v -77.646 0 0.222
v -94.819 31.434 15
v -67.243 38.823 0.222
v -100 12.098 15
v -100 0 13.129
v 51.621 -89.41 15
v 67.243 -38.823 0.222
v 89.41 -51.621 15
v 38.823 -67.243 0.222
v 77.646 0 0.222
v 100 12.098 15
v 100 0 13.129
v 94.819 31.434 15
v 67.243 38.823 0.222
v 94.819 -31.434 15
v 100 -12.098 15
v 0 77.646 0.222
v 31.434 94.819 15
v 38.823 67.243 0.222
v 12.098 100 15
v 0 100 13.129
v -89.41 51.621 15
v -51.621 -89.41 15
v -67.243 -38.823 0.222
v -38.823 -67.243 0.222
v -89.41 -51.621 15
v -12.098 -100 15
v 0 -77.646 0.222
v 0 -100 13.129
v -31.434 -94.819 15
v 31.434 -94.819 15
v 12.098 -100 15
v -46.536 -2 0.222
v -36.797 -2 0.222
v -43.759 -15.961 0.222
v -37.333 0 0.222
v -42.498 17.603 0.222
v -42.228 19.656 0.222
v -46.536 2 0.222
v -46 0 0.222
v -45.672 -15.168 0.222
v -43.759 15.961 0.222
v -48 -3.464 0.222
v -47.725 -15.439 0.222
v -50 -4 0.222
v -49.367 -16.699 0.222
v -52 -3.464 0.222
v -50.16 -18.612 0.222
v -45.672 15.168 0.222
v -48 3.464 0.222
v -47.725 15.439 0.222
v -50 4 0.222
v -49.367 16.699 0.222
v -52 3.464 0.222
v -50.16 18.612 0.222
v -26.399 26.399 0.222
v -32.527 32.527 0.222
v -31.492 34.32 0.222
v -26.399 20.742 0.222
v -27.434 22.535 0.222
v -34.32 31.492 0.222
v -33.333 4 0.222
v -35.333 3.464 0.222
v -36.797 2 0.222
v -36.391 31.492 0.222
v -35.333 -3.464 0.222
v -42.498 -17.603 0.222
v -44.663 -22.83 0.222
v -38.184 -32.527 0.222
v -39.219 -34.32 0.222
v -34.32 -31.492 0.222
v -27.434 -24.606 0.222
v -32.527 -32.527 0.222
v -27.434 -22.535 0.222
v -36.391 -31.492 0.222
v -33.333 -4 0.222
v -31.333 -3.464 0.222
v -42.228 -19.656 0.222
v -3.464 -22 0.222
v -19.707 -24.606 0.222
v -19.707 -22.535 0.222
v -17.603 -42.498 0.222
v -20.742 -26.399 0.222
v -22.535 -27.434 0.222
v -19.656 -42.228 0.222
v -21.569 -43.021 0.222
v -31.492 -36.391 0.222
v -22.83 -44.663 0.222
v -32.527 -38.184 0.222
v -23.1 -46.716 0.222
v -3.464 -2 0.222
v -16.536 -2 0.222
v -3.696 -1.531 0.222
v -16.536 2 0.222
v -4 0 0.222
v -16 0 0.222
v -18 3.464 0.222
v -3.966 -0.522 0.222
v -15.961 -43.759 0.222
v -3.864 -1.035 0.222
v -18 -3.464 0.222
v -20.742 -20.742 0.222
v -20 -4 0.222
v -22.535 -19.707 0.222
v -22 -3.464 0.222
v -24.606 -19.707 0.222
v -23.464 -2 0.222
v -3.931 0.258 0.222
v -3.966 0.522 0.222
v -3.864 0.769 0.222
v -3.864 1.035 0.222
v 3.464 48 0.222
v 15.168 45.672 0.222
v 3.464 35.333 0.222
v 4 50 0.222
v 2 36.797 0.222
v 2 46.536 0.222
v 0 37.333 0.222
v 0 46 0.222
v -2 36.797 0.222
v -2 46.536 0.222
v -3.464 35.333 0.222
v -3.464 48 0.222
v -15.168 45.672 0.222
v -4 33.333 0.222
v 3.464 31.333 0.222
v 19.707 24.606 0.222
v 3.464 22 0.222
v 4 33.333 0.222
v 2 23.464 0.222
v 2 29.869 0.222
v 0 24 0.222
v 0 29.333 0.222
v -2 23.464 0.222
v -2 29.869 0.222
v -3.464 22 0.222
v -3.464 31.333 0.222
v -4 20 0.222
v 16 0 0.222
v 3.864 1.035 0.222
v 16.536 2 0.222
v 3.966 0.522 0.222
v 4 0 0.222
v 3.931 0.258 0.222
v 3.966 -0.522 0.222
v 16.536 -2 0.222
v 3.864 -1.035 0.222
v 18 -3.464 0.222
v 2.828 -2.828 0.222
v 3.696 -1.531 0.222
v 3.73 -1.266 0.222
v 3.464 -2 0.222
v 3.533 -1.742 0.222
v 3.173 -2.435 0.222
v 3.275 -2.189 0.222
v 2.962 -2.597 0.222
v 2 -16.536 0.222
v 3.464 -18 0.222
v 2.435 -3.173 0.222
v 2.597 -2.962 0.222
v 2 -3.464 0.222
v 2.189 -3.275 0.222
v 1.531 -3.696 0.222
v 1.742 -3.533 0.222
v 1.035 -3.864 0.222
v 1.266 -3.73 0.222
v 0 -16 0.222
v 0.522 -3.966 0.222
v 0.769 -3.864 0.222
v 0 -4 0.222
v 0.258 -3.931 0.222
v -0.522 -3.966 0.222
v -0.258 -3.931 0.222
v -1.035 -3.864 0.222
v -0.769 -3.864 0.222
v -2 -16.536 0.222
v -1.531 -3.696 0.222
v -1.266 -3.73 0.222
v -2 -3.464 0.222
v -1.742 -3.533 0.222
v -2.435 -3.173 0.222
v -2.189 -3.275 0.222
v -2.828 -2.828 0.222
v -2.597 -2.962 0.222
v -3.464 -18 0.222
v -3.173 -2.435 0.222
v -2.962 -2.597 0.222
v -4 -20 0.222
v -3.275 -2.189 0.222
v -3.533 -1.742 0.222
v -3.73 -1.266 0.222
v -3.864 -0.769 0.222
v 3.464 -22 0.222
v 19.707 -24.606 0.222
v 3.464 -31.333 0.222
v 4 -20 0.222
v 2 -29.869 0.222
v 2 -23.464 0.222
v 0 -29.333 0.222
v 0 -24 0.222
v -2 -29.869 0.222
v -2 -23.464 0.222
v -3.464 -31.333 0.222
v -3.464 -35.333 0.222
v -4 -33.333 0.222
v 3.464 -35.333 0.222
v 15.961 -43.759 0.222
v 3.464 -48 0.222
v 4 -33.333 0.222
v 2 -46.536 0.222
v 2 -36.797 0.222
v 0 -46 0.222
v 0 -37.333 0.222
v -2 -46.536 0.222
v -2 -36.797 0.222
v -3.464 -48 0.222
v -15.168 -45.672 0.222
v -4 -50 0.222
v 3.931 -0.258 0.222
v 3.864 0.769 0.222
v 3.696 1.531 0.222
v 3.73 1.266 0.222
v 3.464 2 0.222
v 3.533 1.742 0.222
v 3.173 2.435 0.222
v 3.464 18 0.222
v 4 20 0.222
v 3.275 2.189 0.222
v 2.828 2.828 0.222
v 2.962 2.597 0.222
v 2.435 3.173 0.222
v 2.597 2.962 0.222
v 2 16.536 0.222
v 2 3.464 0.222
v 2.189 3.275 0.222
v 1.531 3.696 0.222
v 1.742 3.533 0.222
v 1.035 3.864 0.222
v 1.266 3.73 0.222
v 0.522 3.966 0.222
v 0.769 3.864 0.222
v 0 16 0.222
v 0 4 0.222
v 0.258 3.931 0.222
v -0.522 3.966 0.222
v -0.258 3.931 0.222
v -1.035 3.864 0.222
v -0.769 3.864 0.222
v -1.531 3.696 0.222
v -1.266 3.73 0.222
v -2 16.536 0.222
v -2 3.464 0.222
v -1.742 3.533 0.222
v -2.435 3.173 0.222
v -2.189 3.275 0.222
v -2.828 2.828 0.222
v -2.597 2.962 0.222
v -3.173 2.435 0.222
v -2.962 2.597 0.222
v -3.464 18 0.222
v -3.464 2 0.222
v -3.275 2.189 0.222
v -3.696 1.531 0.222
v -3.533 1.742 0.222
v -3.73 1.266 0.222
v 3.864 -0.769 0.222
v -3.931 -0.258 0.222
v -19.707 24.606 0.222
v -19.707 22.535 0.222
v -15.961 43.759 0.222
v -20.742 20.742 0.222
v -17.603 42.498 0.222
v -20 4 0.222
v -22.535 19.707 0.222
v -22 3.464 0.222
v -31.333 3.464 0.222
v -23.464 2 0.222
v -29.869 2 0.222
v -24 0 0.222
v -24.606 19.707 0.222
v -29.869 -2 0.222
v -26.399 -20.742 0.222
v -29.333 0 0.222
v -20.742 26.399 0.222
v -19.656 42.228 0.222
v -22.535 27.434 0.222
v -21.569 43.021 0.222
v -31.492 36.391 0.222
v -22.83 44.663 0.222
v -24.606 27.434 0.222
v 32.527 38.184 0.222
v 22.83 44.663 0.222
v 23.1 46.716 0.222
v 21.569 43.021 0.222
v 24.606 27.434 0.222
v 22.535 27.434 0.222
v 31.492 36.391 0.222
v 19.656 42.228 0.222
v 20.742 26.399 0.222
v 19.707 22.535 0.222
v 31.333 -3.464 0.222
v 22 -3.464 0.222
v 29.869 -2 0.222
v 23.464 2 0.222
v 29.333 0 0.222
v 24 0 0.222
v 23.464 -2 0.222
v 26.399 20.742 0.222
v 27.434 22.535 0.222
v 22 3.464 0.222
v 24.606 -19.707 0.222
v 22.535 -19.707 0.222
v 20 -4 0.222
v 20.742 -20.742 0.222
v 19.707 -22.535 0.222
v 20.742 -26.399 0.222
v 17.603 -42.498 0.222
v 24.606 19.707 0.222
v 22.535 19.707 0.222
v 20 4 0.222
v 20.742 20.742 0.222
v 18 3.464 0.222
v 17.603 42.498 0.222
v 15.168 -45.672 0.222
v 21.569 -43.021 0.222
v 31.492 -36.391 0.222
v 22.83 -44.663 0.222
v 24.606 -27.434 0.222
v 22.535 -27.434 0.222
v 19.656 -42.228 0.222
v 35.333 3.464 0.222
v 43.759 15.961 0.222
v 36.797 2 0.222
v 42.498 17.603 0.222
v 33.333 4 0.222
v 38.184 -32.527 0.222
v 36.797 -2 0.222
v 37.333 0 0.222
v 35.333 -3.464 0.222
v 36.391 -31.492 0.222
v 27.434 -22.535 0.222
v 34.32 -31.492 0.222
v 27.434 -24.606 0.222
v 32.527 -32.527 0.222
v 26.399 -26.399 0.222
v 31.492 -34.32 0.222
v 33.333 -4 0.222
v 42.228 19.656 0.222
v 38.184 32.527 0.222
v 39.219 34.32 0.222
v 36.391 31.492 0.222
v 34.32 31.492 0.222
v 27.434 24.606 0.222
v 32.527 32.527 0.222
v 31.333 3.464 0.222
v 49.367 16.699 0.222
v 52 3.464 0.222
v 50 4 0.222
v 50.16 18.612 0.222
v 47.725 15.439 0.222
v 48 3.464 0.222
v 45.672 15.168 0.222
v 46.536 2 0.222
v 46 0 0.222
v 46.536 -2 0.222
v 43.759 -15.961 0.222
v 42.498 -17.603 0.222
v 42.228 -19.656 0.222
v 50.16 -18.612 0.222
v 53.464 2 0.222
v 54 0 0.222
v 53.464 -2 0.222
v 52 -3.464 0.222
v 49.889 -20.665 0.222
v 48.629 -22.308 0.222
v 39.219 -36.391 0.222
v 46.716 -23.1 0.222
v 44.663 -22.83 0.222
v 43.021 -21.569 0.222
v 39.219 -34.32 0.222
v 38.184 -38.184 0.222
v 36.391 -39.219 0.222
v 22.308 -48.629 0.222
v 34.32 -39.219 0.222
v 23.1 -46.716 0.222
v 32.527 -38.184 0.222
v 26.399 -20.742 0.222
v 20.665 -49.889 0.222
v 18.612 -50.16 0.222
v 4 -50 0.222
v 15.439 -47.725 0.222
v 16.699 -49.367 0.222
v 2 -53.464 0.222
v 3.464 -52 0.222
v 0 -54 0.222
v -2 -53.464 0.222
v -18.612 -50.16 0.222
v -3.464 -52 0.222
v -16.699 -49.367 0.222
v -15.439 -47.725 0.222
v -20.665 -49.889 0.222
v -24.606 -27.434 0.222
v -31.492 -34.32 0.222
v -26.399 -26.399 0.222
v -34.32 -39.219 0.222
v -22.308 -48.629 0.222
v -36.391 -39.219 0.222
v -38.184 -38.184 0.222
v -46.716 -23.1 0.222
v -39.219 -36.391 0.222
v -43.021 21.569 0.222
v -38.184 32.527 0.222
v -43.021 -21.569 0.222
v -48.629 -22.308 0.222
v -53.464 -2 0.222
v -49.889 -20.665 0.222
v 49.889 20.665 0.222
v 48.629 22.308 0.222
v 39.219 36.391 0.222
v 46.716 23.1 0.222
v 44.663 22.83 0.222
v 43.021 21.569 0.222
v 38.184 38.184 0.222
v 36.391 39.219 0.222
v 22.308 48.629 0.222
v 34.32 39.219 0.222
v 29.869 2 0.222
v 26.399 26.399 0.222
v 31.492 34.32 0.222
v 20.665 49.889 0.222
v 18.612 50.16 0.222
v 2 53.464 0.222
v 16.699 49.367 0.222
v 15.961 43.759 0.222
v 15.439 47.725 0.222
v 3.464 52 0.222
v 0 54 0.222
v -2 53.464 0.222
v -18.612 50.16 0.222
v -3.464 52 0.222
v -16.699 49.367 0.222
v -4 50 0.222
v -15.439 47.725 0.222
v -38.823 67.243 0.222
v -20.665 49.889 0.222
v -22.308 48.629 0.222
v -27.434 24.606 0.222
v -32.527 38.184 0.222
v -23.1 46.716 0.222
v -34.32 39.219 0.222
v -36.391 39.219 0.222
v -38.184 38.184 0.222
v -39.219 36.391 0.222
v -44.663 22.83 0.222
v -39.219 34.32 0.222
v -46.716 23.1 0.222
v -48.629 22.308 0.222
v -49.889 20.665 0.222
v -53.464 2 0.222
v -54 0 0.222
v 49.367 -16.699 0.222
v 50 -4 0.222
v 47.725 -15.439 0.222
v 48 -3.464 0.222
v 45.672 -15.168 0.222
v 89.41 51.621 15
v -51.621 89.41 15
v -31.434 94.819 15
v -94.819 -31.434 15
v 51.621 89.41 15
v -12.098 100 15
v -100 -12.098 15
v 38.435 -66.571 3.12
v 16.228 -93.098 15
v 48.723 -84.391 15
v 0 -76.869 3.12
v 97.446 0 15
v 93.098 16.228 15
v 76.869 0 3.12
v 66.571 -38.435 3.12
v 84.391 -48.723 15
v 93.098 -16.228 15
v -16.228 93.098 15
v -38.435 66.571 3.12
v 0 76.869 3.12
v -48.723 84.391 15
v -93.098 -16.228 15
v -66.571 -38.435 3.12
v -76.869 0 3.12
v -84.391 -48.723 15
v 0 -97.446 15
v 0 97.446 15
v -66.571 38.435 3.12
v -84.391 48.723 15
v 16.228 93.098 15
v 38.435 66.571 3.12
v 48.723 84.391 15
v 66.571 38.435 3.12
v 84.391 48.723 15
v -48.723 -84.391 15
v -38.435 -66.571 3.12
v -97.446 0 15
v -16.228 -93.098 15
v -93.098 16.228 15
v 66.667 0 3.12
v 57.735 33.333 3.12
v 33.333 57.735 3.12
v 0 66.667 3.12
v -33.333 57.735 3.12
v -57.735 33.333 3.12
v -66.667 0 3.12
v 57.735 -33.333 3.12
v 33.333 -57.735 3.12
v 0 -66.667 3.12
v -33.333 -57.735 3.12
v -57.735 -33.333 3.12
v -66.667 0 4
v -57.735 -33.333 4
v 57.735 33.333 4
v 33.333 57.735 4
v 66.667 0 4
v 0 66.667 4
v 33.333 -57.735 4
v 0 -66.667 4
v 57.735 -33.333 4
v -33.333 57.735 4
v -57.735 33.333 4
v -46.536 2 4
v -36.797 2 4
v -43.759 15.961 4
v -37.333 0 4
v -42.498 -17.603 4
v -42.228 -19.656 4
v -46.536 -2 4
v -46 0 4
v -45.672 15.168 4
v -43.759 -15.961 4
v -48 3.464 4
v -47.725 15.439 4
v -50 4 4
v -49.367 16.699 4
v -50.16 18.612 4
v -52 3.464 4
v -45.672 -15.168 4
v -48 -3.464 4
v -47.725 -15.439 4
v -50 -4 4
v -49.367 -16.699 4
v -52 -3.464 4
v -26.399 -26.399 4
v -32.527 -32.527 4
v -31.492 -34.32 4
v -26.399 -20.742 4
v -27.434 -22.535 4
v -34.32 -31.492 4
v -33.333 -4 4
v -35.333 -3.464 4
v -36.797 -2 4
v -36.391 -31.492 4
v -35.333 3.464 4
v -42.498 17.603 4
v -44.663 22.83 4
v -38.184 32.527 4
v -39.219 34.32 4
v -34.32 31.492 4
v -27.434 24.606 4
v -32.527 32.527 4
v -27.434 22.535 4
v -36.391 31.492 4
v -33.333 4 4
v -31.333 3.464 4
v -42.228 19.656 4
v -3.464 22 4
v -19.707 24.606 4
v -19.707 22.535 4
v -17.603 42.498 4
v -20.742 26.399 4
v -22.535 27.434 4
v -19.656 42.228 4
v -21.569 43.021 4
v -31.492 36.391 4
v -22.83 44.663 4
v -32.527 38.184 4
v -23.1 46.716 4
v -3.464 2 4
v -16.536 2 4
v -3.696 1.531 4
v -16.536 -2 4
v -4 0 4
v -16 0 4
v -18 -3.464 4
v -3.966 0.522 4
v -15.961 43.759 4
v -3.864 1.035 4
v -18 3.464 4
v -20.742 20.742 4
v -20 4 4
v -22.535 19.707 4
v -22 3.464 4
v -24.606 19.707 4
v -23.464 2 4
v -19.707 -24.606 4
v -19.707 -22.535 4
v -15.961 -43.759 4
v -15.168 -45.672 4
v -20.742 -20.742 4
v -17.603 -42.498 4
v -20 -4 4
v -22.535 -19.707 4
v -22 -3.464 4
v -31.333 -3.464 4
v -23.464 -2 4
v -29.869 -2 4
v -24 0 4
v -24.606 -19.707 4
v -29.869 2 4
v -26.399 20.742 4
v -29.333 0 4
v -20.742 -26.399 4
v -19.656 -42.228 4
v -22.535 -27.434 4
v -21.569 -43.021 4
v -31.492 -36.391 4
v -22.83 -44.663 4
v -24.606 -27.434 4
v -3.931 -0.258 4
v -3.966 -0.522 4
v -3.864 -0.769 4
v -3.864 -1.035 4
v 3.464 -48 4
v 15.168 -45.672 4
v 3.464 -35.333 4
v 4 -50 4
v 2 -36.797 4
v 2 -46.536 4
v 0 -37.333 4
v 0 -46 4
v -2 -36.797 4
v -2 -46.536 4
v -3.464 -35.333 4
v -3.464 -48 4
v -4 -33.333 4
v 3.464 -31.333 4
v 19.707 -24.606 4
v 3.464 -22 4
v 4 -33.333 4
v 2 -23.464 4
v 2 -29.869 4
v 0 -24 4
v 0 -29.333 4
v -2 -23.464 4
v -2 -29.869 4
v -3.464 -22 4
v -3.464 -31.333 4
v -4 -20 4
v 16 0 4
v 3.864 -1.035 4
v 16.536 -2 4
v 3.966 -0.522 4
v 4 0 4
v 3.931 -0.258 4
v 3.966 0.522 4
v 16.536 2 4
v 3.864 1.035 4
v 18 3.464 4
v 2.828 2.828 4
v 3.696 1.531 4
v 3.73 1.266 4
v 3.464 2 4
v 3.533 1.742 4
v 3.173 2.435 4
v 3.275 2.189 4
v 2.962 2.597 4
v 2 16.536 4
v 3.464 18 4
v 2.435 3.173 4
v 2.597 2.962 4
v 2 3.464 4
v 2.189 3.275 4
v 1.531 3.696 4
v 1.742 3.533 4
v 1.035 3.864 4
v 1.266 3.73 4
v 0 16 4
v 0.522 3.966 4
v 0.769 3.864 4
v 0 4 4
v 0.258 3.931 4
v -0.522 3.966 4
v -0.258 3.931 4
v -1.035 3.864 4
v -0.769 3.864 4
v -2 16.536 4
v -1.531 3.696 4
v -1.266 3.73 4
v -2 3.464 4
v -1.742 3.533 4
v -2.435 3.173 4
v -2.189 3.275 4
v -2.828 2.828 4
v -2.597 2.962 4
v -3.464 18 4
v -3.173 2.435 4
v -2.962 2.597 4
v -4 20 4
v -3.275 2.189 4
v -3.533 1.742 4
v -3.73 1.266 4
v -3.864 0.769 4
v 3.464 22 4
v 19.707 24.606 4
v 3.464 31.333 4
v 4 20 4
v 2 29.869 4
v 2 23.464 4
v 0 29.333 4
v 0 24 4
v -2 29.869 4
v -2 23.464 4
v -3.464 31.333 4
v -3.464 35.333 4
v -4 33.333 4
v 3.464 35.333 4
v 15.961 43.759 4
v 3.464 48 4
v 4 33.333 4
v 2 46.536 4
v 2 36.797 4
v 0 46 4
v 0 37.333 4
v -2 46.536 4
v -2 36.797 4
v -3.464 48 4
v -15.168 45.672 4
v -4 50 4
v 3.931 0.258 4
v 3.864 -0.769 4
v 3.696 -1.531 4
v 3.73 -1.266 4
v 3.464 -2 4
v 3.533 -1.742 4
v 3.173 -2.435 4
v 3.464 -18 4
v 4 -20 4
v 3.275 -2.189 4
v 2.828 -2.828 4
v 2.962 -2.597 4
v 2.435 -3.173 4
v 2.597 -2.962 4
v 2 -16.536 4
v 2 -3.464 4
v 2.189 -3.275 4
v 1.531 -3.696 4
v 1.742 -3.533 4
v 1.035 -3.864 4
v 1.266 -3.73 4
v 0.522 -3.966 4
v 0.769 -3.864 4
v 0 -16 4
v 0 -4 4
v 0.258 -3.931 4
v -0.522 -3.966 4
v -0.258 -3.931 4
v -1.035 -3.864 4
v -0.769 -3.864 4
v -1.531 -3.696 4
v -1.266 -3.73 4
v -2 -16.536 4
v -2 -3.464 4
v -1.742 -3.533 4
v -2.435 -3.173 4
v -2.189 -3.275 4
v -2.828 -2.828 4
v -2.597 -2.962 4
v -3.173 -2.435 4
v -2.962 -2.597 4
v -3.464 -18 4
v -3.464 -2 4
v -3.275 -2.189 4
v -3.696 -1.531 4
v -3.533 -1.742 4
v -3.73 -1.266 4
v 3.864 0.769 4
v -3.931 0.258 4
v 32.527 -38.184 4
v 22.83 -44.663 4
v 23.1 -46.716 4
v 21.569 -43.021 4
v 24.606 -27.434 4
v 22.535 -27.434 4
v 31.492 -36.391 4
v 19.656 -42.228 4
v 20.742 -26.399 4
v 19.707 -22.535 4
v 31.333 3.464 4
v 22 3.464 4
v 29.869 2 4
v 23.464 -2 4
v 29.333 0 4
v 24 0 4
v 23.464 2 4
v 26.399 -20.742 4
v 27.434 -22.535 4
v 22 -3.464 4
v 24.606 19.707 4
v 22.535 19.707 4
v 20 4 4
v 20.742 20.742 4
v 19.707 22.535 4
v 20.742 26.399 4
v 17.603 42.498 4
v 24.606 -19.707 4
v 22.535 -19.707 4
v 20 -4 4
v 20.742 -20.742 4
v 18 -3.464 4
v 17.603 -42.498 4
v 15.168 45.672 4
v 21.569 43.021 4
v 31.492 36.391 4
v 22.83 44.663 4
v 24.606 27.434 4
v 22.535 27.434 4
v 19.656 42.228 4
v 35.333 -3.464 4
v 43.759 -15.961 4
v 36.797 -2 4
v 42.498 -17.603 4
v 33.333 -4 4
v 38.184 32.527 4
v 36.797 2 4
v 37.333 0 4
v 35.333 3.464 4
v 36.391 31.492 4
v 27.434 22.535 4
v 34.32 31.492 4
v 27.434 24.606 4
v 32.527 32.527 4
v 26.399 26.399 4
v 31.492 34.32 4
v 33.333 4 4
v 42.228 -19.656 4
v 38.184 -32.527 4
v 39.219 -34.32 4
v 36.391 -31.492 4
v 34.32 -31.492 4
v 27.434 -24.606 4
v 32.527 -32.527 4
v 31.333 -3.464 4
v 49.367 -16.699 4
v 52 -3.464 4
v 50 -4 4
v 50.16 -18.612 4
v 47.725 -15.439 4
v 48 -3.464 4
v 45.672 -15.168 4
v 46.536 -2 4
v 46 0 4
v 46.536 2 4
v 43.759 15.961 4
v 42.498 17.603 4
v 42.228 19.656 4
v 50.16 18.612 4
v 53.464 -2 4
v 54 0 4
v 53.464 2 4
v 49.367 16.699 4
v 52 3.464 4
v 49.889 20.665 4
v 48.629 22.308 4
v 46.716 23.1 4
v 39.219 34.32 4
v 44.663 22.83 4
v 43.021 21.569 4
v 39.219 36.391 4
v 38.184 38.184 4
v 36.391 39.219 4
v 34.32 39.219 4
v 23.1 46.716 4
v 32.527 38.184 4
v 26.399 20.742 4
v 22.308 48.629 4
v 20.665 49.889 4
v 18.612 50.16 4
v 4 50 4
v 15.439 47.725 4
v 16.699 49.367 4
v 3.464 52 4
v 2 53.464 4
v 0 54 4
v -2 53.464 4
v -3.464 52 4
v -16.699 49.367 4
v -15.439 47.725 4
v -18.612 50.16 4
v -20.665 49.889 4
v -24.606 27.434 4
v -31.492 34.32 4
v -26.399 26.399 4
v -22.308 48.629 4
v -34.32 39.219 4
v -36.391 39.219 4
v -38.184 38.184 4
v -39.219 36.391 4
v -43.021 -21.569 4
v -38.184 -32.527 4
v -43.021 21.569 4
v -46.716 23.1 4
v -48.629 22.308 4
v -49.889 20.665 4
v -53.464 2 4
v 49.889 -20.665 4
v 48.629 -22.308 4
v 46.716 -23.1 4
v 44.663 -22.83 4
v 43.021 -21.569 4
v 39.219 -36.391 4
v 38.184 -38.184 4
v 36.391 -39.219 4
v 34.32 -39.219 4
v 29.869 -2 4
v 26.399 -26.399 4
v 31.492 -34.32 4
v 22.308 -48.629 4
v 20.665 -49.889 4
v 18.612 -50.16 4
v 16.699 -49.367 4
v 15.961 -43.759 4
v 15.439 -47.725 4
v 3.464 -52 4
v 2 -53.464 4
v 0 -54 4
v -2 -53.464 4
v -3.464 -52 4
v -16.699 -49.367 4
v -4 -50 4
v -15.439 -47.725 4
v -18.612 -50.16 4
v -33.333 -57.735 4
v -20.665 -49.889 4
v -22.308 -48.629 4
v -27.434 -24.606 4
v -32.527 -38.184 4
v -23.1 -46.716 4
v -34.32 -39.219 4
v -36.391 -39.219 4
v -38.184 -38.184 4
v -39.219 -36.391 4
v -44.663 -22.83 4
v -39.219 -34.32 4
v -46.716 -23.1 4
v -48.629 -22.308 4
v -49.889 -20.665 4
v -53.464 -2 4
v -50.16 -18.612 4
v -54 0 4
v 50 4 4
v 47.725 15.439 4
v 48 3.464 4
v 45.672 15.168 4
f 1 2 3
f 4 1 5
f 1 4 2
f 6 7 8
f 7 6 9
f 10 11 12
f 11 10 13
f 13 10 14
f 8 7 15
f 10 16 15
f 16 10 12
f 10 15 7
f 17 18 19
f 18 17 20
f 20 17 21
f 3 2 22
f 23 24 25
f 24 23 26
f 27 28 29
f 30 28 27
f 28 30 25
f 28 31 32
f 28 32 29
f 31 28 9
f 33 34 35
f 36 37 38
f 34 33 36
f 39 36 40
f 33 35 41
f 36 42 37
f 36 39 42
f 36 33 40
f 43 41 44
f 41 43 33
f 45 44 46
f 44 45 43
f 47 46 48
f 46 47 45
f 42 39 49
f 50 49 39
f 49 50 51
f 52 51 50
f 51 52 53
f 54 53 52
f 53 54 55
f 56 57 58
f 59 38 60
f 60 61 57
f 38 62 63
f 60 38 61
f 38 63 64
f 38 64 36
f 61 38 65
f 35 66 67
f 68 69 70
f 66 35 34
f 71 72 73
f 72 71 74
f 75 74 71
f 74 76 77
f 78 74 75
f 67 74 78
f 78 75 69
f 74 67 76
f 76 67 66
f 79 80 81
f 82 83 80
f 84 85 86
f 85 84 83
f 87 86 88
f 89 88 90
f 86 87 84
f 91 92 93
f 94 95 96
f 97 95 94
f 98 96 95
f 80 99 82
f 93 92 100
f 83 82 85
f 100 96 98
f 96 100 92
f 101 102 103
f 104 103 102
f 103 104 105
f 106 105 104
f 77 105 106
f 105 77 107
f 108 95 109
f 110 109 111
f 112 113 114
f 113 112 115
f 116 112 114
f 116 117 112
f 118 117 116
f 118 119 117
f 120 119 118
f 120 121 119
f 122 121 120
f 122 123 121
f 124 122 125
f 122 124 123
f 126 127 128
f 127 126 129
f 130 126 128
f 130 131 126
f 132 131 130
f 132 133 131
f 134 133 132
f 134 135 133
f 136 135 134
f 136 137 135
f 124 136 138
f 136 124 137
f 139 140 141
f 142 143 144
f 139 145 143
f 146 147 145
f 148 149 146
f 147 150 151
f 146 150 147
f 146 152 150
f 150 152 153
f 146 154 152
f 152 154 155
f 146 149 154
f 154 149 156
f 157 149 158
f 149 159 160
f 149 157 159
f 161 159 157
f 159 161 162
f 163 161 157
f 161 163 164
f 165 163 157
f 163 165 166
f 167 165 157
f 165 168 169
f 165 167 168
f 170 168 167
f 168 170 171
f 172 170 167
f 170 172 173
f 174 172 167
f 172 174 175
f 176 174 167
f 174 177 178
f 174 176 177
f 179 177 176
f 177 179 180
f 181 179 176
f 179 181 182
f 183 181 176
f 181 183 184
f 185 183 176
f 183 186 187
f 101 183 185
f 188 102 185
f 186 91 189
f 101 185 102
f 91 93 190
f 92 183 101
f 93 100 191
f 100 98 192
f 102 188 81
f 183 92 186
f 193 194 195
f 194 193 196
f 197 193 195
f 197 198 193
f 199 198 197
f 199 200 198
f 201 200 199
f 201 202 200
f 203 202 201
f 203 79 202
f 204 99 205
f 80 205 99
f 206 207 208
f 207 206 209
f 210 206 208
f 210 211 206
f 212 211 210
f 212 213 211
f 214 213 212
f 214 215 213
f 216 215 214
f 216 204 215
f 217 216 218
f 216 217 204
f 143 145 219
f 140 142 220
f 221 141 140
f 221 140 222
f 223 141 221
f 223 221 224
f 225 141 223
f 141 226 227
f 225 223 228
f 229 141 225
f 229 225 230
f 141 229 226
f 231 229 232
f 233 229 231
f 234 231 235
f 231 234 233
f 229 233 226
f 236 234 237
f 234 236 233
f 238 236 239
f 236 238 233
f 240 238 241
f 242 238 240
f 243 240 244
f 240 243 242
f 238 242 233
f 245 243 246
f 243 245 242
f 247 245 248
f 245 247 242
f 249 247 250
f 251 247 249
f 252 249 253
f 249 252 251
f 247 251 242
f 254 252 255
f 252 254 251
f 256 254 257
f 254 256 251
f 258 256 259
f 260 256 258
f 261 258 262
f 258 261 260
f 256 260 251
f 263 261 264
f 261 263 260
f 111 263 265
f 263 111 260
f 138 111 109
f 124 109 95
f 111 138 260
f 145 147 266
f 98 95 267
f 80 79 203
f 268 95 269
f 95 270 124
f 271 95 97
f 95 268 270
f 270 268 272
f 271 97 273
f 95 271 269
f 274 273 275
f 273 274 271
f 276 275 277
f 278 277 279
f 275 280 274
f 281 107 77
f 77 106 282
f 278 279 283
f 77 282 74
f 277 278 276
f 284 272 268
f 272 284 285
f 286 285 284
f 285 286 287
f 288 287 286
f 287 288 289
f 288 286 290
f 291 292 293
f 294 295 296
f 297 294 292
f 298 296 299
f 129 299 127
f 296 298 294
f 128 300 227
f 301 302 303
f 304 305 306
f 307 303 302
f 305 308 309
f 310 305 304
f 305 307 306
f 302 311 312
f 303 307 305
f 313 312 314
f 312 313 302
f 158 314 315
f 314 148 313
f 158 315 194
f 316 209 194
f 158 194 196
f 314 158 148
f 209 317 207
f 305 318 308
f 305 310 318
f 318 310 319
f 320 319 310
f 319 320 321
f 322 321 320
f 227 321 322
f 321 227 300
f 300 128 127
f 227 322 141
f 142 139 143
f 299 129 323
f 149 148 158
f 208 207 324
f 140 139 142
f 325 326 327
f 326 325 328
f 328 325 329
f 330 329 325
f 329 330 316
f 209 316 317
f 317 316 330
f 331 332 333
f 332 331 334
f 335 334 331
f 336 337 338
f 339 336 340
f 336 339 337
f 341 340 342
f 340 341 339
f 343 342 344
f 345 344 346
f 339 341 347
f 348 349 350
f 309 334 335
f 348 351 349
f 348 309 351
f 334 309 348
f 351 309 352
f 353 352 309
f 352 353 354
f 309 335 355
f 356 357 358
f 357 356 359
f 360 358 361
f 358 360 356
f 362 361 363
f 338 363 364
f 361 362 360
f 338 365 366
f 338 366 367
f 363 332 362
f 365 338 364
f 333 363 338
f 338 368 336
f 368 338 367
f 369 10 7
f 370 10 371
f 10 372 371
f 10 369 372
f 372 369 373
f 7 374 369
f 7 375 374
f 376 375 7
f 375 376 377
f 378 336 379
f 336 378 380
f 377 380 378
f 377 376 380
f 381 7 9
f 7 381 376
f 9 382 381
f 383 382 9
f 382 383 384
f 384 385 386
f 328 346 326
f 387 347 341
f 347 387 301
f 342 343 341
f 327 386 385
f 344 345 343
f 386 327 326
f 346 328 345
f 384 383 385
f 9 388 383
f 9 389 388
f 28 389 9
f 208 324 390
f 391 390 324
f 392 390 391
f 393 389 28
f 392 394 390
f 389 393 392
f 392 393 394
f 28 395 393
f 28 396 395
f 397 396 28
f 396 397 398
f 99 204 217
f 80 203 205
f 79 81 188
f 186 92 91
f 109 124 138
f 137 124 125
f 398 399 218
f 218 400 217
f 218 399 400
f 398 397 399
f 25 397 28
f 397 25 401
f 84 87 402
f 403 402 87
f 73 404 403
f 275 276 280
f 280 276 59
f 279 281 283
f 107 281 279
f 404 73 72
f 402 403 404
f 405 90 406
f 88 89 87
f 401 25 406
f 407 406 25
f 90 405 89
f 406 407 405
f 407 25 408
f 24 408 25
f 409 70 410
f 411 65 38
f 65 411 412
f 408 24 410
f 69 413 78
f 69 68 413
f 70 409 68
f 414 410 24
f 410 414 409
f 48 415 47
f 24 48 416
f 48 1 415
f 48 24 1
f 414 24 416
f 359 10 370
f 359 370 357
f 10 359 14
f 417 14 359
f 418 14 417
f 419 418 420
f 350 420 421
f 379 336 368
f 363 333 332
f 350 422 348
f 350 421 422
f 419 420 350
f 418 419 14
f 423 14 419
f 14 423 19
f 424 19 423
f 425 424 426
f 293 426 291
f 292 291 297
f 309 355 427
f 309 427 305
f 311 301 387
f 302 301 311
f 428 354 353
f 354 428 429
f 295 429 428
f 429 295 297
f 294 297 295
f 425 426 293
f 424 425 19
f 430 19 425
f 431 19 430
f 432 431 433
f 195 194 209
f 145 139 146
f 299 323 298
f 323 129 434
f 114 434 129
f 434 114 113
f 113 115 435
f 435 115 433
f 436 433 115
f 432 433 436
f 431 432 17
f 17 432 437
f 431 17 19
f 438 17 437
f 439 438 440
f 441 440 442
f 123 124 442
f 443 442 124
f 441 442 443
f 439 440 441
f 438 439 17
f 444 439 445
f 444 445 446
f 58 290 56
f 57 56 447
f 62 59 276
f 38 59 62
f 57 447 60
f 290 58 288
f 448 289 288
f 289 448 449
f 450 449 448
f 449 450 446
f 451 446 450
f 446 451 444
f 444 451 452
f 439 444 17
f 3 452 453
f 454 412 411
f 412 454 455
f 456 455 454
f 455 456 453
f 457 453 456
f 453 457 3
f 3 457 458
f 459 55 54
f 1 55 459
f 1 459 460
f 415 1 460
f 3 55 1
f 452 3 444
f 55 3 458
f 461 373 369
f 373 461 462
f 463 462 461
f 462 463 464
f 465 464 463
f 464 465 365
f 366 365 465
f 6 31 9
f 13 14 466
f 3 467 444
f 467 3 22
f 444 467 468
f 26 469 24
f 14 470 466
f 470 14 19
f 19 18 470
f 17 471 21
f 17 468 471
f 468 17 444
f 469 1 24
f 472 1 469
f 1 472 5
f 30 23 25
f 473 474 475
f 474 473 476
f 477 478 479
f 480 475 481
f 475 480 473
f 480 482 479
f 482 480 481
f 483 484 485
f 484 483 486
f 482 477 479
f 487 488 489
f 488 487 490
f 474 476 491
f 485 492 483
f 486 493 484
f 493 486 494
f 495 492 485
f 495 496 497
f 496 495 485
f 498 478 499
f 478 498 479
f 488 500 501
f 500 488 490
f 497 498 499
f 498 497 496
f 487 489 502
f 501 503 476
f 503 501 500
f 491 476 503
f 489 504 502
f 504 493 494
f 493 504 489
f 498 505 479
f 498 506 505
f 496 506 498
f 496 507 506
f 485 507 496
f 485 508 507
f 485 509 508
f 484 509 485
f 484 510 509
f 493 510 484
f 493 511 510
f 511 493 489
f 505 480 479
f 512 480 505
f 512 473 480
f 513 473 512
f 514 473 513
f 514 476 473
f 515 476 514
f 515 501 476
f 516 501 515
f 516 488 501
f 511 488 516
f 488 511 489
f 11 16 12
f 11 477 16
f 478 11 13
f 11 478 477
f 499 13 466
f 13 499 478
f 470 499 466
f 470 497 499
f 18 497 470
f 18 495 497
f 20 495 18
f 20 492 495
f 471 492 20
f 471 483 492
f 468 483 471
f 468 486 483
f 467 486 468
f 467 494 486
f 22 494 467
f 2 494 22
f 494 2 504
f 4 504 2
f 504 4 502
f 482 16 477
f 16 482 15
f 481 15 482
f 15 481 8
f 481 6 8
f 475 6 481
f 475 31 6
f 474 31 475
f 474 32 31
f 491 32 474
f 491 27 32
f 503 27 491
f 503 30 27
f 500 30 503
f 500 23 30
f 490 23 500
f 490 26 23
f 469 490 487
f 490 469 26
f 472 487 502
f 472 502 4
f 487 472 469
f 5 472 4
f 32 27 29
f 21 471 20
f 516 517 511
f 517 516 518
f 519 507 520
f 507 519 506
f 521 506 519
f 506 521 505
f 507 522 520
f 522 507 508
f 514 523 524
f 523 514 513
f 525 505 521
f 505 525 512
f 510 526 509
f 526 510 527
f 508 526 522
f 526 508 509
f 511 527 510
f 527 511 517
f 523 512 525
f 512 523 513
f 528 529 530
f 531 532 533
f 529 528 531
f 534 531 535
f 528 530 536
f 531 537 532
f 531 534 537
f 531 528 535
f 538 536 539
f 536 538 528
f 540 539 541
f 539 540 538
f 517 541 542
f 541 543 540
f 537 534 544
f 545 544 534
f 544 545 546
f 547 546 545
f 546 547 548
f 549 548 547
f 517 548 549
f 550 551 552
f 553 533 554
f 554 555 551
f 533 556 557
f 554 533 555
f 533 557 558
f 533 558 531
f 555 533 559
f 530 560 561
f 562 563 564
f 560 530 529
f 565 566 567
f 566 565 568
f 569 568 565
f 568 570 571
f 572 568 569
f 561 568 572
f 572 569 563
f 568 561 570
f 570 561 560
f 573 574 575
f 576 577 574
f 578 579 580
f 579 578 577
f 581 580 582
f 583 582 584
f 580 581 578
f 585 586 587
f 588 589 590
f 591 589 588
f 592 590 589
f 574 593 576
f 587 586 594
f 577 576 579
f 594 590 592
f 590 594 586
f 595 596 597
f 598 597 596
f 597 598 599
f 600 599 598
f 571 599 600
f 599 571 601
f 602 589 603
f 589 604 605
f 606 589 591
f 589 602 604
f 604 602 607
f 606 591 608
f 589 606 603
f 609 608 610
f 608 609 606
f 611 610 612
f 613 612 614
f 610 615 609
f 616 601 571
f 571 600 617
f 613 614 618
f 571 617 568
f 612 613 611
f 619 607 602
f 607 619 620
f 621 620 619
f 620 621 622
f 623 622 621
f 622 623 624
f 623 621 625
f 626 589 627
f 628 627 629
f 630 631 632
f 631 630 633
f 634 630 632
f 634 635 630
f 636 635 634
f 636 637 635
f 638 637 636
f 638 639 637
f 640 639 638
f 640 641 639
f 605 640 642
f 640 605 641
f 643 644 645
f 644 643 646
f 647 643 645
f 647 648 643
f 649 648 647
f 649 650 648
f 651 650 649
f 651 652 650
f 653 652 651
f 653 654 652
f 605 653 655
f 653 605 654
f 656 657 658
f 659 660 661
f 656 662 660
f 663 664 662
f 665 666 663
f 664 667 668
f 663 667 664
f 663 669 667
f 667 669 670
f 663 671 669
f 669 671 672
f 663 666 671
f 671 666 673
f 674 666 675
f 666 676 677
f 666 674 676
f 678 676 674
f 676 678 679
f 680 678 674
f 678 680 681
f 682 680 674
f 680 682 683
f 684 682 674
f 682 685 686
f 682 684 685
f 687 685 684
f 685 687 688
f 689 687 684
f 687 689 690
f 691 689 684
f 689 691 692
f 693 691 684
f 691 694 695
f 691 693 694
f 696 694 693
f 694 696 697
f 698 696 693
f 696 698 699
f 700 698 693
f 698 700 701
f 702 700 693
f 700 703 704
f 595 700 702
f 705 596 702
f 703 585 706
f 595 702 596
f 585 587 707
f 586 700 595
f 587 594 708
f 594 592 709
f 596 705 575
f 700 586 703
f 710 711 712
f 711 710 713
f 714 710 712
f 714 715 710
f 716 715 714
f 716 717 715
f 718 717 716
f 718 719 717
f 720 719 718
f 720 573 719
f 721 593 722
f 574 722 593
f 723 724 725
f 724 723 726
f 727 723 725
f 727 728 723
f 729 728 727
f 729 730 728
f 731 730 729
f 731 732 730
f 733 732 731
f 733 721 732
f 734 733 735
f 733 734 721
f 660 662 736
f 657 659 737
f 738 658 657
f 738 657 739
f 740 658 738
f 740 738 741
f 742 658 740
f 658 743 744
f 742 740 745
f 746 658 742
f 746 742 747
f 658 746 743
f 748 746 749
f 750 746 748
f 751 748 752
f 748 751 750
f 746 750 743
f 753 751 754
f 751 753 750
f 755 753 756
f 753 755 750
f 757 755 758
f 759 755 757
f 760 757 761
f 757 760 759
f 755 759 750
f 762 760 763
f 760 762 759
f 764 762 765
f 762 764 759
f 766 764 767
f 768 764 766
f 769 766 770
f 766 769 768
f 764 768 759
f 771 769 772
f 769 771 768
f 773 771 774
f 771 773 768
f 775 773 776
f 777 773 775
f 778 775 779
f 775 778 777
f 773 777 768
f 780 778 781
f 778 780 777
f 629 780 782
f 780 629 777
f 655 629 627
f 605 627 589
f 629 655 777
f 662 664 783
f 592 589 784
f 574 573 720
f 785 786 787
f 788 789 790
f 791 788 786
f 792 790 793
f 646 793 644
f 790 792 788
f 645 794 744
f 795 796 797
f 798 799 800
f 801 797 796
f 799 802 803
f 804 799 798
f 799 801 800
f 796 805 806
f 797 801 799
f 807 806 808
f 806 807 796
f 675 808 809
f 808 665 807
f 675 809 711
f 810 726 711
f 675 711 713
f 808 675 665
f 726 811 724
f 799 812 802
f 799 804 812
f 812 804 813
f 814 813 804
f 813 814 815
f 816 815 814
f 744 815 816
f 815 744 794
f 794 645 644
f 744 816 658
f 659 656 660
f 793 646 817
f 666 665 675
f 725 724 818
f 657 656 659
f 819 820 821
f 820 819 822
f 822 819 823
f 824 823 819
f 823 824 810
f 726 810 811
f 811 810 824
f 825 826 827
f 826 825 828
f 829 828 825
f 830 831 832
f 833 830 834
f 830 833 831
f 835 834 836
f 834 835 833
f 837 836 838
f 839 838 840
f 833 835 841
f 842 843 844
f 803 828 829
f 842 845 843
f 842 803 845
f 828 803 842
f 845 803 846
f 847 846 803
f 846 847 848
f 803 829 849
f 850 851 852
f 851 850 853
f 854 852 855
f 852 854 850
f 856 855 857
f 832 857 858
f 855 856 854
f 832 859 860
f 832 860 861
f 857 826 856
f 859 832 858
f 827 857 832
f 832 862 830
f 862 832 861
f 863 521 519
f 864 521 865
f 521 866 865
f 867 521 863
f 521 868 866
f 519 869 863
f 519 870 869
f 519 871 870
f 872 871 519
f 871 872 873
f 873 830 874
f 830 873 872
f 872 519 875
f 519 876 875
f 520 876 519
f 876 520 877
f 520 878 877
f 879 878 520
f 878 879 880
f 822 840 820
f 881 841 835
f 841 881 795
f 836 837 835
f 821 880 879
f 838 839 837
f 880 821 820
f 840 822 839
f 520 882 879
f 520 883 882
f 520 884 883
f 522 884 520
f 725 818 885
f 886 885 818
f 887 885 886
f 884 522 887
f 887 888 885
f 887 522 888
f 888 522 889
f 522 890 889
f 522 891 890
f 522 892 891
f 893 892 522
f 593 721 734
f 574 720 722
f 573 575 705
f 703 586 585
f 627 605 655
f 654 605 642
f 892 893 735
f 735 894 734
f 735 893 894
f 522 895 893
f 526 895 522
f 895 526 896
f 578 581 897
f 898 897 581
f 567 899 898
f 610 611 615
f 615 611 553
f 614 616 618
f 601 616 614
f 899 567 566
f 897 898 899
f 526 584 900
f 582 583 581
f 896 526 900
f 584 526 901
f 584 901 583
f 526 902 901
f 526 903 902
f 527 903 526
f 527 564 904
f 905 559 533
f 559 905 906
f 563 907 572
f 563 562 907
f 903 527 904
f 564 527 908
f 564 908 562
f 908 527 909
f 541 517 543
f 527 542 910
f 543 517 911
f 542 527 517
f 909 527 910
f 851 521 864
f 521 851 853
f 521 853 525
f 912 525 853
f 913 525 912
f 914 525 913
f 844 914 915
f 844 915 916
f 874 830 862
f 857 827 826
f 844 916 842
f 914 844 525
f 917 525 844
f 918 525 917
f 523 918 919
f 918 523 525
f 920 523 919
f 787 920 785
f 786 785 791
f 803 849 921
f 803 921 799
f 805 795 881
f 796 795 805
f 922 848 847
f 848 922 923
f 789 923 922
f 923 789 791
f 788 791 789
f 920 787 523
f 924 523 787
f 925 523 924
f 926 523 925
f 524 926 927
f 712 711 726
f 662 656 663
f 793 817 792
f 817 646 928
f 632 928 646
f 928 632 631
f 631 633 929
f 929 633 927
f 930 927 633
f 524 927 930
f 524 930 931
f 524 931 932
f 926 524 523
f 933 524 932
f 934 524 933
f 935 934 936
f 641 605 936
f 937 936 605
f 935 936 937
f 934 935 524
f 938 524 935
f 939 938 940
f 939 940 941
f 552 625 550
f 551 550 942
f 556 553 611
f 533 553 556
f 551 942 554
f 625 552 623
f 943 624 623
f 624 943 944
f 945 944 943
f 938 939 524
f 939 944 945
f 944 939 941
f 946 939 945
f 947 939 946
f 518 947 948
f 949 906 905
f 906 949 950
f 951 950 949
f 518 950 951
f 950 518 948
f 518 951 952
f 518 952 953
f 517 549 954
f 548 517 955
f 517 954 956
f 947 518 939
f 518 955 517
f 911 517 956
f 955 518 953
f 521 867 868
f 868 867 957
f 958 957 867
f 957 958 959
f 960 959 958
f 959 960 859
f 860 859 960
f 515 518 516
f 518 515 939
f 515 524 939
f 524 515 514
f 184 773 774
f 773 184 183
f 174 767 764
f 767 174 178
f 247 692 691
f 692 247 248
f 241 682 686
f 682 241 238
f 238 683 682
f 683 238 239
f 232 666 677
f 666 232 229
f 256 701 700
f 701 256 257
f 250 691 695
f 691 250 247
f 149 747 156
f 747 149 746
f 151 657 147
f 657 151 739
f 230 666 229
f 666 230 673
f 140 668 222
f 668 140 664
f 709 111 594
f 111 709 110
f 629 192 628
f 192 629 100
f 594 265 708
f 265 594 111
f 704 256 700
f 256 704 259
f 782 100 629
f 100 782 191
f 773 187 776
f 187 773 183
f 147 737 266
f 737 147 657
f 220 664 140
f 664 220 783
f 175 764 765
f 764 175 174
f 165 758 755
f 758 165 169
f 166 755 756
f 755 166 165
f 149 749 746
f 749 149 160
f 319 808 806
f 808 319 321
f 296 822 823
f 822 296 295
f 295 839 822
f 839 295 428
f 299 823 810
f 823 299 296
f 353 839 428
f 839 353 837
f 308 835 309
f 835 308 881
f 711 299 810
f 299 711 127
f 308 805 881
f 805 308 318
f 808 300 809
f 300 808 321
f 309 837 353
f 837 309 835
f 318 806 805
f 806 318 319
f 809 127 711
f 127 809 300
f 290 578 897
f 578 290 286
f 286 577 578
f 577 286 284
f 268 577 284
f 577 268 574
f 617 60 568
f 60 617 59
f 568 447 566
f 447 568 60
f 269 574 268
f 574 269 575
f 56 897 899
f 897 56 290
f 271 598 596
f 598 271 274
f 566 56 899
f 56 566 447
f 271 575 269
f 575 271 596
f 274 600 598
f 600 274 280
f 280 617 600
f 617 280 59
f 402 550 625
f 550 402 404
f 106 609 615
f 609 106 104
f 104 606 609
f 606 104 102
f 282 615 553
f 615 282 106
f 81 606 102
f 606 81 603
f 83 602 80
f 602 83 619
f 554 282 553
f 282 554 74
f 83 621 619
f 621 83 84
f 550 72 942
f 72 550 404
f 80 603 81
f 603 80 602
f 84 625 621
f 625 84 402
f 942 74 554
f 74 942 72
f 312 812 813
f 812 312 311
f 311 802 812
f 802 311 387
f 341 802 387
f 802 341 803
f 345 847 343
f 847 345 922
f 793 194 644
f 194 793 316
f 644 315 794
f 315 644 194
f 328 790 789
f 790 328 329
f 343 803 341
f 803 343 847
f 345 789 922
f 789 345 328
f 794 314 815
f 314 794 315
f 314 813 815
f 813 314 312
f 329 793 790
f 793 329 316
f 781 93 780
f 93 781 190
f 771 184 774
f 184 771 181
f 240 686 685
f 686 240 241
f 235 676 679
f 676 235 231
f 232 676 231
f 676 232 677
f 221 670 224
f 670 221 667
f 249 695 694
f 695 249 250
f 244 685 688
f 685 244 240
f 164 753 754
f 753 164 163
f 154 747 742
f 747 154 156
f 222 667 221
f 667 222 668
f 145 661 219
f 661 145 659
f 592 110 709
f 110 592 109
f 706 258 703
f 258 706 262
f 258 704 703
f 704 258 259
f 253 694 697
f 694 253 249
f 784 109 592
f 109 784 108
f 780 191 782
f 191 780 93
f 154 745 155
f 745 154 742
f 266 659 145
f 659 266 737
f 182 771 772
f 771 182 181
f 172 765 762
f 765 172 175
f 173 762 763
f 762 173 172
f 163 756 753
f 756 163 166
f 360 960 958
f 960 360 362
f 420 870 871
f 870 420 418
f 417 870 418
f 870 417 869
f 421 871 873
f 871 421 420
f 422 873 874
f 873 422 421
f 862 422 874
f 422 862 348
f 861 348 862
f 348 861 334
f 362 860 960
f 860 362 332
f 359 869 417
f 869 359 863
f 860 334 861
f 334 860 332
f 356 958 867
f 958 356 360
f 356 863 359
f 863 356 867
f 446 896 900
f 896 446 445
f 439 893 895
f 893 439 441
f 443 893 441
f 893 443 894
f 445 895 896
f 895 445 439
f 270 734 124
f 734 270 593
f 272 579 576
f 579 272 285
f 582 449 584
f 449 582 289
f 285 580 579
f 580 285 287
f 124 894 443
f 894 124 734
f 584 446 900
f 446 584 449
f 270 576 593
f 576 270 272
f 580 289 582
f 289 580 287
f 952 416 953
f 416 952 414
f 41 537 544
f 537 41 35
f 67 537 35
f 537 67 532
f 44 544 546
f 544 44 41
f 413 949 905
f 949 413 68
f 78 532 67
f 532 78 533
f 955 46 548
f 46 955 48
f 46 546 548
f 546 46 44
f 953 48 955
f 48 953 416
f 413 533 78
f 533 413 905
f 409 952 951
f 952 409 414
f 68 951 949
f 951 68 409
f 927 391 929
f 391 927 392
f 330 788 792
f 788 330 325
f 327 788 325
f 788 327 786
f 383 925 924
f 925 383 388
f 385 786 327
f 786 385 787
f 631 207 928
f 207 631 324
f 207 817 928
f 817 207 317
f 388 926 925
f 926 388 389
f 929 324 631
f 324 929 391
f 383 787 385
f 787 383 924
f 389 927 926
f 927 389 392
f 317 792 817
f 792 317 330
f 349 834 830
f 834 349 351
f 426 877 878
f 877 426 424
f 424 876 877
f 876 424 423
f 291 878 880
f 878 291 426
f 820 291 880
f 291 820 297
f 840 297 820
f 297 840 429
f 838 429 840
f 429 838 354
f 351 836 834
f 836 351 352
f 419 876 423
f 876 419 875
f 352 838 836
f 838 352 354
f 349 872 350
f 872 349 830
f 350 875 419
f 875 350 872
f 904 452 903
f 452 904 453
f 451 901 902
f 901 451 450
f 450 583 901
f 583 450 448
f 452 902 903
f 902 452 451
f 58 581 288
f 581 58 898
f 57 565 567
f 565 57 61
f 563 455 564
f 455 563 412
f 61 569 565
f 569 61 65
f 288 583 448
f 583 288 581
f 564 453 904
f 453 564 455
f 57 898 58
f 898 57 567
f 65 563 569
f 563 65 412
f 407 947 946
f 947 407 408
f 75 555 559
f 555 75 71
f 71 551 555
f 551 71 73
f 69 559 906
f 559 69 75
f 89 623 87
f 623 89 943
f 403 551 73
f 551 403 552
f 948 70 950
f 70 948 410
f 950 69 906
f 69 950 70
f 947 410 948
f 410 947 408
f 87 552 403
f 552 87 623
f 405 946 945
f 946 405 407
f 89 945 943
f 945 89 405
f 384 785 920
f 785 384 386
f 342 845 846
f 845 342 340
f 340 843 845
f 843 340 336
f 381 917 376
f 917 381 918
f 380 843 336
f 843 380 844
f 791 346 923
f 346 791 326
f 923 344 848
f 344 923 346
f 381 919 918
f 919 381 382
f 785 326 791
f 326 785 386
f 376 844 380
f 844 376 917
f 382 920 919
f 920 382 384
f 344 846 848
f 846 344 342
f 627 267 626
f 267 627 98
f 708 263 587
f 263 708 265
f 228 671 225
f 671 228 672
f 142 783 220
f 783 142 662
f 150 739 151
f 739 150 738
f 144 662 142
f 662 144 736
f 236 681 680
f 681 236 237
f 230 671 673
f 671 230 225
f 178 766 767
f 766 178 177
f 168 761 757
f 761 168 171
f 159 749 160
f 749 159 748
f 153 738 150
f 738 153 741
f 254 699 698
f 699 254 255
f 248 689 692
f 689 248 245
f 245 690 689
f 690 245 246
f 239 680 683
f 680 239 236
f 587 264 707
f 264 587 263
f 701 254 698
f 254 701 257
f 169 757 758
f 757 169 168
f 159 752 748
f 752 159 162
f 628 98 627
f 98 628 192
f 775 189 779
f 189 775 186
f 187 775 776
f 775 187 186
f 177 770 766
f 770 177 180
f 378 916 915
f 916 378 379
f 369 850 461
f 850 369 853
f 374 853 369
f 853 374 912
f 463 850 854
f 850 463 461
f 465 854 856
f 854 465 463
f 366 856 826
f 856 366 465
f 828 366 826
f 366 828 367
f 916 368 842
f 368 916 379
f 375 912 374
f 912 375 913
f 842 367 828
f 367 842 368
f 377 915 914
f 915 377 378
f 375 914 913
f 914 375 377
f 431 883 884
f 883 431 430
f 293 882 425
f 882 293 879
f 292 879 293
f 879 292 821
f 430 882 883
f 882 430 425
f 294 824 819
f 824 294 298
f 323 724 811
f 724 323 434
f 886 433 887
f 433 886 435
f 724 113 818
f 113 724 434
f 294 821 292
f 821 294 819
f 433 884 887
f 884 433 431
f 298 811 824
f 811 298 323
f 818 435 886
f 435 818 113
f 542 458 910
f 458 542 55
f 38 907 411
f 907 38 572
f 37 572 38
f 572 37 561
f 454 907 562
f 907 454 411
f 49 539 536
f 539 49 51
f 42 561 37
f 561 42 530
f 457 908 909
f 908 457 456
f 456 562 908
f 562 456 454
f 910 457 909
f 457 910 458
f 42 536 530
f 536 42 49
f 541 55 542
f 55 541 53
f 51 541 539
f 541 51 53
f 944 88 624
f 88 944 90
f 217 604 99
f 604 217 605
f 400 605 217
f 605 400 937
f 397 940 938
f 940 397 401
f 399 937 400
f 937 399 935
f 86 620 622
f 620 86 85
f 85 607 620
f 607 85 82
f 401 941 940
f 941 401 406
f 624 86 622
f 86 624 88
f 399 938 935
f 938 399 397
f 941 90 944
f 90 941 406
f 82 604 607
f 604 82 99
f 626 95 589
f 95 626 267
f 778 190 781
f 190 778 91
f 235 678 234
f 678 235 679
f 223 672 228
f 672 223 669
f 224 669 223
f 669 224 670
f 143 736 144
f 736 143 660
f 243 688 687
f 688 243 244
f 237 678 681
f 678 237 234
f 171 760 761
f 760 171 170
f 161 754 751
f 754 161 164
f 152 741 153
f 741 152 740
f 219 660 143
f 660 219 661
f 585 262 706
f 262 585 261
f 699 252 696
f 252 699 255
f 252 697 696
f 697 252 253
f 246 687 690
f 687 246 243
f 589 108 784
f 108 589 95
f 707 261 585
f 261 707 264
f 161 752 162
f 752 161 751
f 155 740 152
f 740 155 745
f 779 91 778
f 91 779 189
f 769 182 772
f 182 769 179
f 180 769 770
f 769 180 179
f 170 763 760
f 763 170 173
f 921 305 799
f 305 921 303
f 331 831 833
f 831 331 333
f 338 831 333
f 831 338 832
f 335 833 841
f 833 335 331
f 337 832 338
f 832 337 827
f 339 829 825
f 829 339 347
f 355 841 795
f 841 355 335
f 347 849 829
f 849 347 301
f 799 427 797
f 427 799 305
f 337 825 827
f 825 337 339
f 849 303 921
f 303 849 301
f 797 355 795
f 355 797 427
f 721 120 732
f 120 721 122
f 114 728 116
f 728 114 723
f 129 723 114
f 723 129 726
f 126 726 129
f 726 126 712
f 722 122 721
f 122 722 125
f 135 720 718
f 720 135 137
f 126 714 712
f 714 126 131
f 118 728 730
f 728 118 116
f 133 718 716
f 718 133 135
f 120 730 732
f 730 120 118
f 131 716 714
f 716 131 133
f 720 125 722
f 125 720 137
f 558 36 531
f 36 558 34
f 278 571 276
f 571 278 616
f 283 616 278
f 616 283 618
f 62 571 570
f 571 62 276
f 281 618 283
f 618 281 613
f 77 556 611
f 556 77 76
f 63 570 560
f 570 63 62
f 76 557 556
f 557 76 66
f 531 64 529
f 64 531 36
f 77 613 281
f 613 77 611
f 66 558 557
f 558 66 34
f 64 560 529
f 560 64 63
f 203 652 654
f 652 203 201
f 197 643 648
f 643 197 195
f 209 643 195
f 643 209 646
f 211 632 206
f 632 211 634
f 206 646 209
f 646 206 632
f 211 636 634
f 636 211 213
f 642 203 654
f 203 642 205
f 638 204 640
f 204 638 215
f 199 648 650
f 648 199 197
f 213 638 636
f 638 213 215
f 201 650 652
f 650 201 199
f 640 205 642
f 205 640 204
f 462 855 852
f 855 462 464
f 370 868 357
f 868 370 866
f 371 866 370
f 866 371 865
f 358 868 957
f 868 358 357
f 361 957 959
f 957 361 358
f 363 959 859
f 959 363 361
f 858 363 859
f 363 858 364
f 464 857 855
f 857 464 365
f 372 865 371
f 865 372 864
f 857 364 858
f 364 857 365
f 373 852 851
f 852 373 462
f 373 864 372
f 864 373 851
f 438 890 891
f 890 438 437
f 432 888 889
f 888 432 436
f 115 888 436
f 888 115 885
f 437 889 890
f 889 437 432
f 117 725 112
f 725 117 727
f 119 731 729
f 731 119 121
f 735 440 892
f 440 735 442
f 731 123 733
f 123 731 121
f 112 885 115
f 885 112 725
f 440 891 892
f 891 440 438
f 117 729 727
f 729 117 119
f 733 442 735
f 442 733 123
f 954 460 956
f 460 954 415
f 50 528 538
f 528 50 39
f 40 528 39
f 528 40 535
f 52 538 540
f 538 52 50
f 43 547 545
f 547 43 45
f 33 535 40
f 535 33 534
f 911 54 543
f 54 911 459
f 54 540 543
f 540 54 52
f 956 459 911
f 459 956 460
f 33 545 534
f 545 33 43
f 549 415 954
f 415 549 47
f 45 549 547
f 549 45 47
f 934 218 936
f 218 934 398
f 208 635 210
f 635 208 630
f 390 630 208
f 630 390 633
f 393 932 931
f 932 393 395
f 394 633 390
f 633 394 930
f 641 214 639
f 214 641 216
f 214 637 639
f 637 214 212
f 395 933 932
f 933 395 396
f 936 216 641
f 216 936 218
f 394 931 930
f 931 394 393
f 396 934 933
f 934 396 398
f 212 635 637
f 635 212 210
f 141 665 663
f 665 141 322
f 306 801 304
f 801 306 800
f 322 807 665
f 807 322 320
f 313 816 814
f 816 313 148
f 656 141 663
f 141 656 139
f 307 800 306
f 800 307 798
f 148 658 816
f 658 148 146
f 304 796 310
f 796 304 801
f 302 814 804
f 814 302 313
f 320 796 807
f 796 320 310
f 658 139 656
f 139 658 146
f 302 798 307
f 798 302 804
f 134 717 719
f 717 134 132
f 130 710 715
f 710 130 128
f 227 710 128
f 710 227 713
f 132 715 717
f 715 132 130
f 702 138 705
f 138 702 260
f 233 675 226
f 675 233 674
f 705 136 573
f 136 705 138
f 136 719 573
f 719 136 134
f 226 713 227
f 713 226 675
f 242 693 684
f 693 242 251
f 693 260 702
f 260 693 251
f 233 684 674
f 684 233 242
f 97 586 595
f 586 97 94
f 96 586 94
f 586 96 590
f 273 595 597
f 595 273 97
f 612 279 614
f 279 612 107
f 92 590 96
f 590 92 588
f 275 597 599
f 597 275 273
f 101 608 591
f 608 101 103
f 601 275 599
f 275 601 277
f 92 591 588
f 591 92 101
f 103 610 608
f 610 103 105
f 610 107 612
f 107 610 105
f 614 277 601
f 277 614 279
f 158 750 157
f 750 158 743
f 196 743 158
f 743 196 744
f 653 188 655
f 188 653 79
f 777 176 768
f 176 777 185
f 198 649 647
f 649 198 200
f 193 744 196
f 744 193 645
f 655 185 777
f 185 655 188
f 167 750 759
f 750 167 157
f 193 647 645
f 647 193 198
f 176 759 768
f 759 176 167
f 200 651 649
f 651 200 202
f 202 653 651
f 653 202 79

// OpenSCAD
$fn = 12;

cot_cub = 200;





ray_sph = cot_cub/2*3;
ray_cyl = cot_cub/2;
ray_trou = cot_cub/50;
haut_trou = cot_cub/10;
ep_bor = 3;


translate([0,0,0])
union() {
    difference() {
        union() {
            translate([0,0,ray_sph-cot_cub/20])
            rotate([180,0,0])
            intersection() {
                difference () {
                    sphere(r = ray_sph);
                    sphere(r = ray_sph-ep_bor);
                    
                }
                translate([0,0,ray_sph])
                cube([cot_cub,cot_cub,ray_cyl/2],center = true);

            }



            translate([0,0,ep_bor/4+ep_bor/4+cot_cub/200])
            cylinder(r=ray_cyl/3*2,h=ep_bor,center = true);
        }
        cylinder(r=ray_trou,h=haut_trou,center = true);
        
        translate([ray_cyl/3,0,0])
        cylinder(r=ray_trou,h=haut_trou,center = true);
        
        translate([0,ray_cyl/3,0])
        cylinder(r=ray_trou,h=haut_trou,center = true);
        
        translate([-ray_cyl/3,0,0])
        cylinder(r=ray_trou,h=haut_trou,center = true);
        
        translate([0,-ray_cyl/3,0])
        cylinder(r=ray_trou,h=haut_trou,center = true);
        
        rotate([0,0,45]) {
            
        cylinder(r=ray_trou,h=haut_trou,center = true);
        
        translate([ray_cyl/3,0,0])
        cylinder(r=ray_trou,h=haut_trou,center = true);
        
        translate([0,ray_cyl/3,0])
        cylinder(r=ray_trou,h=haut_trou,center = true);
        
        translate([-ray_cyl/3,0,0])
        cylinder(r=ray_trou,h=haut_trou,center = true);
        
        translate([0,-ray_cyl/3,0])
        cylinder(r=ray_trou,h=haut_trou,center = true);            
        }
        
        
        
        translate([ray_cyl/2,0,0])
        cylinder(r=ray_trou,h=haut_trou,center = true);
        
        translate([0,ray_cyl/2,0])
        cylinder(r=ray_trou,h=haut_trou,center = true);
        
        translate([-ray_cyl/2,0,0])
        cylinder(r=ray_trou,h=haut_trou,center = true);
        
        translate([0,-ray_cyl/2,0])
        cylinder(r=ray_trou,h=haut_trou,center = true);
        
        rotate([0,0,22.5]) {
            
        cylinder(r=ray_trou,h=haut_trou,center = true);
        
        translate([ray_cyl/2,0,0])
        cylinder(r=ray_trou,h=haut_trou,center = true);
        
        translate([0,ray_cyl/2,0])
        cylinder(r=ray_trou,h=haut_trou,center = true);
        
        translate([-ray_cyl/2,0,0])
        cylinder(r=ray_trou,h=haut_trou,center = true);
        
        translate([0,-ray_cyl/2,0])
        cylinder(r=ray_trou,h=haut_trou,center = true);            
        }        

        rotate([0,0,45]) {
            
        cylinder(r=ray_trou,h=haut_trou,center = true);
        
        translate([ray_cyl/2,0,0])
        cylinder(r=ray_trou,h=haut_trou,center = true);
        
        translate([0,ray_cyl/2,0])
        cylinder(r=ray_trou,h=haut_trou,center = true);
        
        translate([-ray_cyl/2,0,0])
        cylinder(r=ray_trou,h=haut_trou,center = true);
        
        translate([0,-ray_cyl/2,0])
        cylinder(r=ray_trou,h=haut_trou,center = true);            
        }             

        rotate([0,0,-22.5]) {
            
        cylinder(r=ray_trou,h=haut_trou,center = true);
        
        translate([ray_cyl/2,0,0])
        cylinder(r=ray_trou,h=haut_trou,center = true);
        
        translate([0,ray_cyl/2,0])
        cylinder(r=ray_trou,h=haut_trou,center = true);
        
        translate([-ray_cyl/2,0,0])
        cylinder(r=ray_trou,h=haut_trou,center = true);
        
        translate([0,-ray_cyl/2,0])
        cylinder(r=ray_trou,h=haut_trou,center = true);            
        }        
        translate([ray_cyl/5,0,0])
        cylinder(r=ray_trou,h=haut_trou,center = true);
        
        translate([0,ray_cyl/5,0])
        cylinder(r=ray_trou,h=haut_trou,center = true);
        
        translate([-ray_cyl/5,0,0])
        cylinder(r=ray_trou,h=haut_trou,center = true);
        
        translate([0,-ray_cyl/5,0])
        cylinder(r=ray_trou,h=haut_trou,center = true);


}

}
